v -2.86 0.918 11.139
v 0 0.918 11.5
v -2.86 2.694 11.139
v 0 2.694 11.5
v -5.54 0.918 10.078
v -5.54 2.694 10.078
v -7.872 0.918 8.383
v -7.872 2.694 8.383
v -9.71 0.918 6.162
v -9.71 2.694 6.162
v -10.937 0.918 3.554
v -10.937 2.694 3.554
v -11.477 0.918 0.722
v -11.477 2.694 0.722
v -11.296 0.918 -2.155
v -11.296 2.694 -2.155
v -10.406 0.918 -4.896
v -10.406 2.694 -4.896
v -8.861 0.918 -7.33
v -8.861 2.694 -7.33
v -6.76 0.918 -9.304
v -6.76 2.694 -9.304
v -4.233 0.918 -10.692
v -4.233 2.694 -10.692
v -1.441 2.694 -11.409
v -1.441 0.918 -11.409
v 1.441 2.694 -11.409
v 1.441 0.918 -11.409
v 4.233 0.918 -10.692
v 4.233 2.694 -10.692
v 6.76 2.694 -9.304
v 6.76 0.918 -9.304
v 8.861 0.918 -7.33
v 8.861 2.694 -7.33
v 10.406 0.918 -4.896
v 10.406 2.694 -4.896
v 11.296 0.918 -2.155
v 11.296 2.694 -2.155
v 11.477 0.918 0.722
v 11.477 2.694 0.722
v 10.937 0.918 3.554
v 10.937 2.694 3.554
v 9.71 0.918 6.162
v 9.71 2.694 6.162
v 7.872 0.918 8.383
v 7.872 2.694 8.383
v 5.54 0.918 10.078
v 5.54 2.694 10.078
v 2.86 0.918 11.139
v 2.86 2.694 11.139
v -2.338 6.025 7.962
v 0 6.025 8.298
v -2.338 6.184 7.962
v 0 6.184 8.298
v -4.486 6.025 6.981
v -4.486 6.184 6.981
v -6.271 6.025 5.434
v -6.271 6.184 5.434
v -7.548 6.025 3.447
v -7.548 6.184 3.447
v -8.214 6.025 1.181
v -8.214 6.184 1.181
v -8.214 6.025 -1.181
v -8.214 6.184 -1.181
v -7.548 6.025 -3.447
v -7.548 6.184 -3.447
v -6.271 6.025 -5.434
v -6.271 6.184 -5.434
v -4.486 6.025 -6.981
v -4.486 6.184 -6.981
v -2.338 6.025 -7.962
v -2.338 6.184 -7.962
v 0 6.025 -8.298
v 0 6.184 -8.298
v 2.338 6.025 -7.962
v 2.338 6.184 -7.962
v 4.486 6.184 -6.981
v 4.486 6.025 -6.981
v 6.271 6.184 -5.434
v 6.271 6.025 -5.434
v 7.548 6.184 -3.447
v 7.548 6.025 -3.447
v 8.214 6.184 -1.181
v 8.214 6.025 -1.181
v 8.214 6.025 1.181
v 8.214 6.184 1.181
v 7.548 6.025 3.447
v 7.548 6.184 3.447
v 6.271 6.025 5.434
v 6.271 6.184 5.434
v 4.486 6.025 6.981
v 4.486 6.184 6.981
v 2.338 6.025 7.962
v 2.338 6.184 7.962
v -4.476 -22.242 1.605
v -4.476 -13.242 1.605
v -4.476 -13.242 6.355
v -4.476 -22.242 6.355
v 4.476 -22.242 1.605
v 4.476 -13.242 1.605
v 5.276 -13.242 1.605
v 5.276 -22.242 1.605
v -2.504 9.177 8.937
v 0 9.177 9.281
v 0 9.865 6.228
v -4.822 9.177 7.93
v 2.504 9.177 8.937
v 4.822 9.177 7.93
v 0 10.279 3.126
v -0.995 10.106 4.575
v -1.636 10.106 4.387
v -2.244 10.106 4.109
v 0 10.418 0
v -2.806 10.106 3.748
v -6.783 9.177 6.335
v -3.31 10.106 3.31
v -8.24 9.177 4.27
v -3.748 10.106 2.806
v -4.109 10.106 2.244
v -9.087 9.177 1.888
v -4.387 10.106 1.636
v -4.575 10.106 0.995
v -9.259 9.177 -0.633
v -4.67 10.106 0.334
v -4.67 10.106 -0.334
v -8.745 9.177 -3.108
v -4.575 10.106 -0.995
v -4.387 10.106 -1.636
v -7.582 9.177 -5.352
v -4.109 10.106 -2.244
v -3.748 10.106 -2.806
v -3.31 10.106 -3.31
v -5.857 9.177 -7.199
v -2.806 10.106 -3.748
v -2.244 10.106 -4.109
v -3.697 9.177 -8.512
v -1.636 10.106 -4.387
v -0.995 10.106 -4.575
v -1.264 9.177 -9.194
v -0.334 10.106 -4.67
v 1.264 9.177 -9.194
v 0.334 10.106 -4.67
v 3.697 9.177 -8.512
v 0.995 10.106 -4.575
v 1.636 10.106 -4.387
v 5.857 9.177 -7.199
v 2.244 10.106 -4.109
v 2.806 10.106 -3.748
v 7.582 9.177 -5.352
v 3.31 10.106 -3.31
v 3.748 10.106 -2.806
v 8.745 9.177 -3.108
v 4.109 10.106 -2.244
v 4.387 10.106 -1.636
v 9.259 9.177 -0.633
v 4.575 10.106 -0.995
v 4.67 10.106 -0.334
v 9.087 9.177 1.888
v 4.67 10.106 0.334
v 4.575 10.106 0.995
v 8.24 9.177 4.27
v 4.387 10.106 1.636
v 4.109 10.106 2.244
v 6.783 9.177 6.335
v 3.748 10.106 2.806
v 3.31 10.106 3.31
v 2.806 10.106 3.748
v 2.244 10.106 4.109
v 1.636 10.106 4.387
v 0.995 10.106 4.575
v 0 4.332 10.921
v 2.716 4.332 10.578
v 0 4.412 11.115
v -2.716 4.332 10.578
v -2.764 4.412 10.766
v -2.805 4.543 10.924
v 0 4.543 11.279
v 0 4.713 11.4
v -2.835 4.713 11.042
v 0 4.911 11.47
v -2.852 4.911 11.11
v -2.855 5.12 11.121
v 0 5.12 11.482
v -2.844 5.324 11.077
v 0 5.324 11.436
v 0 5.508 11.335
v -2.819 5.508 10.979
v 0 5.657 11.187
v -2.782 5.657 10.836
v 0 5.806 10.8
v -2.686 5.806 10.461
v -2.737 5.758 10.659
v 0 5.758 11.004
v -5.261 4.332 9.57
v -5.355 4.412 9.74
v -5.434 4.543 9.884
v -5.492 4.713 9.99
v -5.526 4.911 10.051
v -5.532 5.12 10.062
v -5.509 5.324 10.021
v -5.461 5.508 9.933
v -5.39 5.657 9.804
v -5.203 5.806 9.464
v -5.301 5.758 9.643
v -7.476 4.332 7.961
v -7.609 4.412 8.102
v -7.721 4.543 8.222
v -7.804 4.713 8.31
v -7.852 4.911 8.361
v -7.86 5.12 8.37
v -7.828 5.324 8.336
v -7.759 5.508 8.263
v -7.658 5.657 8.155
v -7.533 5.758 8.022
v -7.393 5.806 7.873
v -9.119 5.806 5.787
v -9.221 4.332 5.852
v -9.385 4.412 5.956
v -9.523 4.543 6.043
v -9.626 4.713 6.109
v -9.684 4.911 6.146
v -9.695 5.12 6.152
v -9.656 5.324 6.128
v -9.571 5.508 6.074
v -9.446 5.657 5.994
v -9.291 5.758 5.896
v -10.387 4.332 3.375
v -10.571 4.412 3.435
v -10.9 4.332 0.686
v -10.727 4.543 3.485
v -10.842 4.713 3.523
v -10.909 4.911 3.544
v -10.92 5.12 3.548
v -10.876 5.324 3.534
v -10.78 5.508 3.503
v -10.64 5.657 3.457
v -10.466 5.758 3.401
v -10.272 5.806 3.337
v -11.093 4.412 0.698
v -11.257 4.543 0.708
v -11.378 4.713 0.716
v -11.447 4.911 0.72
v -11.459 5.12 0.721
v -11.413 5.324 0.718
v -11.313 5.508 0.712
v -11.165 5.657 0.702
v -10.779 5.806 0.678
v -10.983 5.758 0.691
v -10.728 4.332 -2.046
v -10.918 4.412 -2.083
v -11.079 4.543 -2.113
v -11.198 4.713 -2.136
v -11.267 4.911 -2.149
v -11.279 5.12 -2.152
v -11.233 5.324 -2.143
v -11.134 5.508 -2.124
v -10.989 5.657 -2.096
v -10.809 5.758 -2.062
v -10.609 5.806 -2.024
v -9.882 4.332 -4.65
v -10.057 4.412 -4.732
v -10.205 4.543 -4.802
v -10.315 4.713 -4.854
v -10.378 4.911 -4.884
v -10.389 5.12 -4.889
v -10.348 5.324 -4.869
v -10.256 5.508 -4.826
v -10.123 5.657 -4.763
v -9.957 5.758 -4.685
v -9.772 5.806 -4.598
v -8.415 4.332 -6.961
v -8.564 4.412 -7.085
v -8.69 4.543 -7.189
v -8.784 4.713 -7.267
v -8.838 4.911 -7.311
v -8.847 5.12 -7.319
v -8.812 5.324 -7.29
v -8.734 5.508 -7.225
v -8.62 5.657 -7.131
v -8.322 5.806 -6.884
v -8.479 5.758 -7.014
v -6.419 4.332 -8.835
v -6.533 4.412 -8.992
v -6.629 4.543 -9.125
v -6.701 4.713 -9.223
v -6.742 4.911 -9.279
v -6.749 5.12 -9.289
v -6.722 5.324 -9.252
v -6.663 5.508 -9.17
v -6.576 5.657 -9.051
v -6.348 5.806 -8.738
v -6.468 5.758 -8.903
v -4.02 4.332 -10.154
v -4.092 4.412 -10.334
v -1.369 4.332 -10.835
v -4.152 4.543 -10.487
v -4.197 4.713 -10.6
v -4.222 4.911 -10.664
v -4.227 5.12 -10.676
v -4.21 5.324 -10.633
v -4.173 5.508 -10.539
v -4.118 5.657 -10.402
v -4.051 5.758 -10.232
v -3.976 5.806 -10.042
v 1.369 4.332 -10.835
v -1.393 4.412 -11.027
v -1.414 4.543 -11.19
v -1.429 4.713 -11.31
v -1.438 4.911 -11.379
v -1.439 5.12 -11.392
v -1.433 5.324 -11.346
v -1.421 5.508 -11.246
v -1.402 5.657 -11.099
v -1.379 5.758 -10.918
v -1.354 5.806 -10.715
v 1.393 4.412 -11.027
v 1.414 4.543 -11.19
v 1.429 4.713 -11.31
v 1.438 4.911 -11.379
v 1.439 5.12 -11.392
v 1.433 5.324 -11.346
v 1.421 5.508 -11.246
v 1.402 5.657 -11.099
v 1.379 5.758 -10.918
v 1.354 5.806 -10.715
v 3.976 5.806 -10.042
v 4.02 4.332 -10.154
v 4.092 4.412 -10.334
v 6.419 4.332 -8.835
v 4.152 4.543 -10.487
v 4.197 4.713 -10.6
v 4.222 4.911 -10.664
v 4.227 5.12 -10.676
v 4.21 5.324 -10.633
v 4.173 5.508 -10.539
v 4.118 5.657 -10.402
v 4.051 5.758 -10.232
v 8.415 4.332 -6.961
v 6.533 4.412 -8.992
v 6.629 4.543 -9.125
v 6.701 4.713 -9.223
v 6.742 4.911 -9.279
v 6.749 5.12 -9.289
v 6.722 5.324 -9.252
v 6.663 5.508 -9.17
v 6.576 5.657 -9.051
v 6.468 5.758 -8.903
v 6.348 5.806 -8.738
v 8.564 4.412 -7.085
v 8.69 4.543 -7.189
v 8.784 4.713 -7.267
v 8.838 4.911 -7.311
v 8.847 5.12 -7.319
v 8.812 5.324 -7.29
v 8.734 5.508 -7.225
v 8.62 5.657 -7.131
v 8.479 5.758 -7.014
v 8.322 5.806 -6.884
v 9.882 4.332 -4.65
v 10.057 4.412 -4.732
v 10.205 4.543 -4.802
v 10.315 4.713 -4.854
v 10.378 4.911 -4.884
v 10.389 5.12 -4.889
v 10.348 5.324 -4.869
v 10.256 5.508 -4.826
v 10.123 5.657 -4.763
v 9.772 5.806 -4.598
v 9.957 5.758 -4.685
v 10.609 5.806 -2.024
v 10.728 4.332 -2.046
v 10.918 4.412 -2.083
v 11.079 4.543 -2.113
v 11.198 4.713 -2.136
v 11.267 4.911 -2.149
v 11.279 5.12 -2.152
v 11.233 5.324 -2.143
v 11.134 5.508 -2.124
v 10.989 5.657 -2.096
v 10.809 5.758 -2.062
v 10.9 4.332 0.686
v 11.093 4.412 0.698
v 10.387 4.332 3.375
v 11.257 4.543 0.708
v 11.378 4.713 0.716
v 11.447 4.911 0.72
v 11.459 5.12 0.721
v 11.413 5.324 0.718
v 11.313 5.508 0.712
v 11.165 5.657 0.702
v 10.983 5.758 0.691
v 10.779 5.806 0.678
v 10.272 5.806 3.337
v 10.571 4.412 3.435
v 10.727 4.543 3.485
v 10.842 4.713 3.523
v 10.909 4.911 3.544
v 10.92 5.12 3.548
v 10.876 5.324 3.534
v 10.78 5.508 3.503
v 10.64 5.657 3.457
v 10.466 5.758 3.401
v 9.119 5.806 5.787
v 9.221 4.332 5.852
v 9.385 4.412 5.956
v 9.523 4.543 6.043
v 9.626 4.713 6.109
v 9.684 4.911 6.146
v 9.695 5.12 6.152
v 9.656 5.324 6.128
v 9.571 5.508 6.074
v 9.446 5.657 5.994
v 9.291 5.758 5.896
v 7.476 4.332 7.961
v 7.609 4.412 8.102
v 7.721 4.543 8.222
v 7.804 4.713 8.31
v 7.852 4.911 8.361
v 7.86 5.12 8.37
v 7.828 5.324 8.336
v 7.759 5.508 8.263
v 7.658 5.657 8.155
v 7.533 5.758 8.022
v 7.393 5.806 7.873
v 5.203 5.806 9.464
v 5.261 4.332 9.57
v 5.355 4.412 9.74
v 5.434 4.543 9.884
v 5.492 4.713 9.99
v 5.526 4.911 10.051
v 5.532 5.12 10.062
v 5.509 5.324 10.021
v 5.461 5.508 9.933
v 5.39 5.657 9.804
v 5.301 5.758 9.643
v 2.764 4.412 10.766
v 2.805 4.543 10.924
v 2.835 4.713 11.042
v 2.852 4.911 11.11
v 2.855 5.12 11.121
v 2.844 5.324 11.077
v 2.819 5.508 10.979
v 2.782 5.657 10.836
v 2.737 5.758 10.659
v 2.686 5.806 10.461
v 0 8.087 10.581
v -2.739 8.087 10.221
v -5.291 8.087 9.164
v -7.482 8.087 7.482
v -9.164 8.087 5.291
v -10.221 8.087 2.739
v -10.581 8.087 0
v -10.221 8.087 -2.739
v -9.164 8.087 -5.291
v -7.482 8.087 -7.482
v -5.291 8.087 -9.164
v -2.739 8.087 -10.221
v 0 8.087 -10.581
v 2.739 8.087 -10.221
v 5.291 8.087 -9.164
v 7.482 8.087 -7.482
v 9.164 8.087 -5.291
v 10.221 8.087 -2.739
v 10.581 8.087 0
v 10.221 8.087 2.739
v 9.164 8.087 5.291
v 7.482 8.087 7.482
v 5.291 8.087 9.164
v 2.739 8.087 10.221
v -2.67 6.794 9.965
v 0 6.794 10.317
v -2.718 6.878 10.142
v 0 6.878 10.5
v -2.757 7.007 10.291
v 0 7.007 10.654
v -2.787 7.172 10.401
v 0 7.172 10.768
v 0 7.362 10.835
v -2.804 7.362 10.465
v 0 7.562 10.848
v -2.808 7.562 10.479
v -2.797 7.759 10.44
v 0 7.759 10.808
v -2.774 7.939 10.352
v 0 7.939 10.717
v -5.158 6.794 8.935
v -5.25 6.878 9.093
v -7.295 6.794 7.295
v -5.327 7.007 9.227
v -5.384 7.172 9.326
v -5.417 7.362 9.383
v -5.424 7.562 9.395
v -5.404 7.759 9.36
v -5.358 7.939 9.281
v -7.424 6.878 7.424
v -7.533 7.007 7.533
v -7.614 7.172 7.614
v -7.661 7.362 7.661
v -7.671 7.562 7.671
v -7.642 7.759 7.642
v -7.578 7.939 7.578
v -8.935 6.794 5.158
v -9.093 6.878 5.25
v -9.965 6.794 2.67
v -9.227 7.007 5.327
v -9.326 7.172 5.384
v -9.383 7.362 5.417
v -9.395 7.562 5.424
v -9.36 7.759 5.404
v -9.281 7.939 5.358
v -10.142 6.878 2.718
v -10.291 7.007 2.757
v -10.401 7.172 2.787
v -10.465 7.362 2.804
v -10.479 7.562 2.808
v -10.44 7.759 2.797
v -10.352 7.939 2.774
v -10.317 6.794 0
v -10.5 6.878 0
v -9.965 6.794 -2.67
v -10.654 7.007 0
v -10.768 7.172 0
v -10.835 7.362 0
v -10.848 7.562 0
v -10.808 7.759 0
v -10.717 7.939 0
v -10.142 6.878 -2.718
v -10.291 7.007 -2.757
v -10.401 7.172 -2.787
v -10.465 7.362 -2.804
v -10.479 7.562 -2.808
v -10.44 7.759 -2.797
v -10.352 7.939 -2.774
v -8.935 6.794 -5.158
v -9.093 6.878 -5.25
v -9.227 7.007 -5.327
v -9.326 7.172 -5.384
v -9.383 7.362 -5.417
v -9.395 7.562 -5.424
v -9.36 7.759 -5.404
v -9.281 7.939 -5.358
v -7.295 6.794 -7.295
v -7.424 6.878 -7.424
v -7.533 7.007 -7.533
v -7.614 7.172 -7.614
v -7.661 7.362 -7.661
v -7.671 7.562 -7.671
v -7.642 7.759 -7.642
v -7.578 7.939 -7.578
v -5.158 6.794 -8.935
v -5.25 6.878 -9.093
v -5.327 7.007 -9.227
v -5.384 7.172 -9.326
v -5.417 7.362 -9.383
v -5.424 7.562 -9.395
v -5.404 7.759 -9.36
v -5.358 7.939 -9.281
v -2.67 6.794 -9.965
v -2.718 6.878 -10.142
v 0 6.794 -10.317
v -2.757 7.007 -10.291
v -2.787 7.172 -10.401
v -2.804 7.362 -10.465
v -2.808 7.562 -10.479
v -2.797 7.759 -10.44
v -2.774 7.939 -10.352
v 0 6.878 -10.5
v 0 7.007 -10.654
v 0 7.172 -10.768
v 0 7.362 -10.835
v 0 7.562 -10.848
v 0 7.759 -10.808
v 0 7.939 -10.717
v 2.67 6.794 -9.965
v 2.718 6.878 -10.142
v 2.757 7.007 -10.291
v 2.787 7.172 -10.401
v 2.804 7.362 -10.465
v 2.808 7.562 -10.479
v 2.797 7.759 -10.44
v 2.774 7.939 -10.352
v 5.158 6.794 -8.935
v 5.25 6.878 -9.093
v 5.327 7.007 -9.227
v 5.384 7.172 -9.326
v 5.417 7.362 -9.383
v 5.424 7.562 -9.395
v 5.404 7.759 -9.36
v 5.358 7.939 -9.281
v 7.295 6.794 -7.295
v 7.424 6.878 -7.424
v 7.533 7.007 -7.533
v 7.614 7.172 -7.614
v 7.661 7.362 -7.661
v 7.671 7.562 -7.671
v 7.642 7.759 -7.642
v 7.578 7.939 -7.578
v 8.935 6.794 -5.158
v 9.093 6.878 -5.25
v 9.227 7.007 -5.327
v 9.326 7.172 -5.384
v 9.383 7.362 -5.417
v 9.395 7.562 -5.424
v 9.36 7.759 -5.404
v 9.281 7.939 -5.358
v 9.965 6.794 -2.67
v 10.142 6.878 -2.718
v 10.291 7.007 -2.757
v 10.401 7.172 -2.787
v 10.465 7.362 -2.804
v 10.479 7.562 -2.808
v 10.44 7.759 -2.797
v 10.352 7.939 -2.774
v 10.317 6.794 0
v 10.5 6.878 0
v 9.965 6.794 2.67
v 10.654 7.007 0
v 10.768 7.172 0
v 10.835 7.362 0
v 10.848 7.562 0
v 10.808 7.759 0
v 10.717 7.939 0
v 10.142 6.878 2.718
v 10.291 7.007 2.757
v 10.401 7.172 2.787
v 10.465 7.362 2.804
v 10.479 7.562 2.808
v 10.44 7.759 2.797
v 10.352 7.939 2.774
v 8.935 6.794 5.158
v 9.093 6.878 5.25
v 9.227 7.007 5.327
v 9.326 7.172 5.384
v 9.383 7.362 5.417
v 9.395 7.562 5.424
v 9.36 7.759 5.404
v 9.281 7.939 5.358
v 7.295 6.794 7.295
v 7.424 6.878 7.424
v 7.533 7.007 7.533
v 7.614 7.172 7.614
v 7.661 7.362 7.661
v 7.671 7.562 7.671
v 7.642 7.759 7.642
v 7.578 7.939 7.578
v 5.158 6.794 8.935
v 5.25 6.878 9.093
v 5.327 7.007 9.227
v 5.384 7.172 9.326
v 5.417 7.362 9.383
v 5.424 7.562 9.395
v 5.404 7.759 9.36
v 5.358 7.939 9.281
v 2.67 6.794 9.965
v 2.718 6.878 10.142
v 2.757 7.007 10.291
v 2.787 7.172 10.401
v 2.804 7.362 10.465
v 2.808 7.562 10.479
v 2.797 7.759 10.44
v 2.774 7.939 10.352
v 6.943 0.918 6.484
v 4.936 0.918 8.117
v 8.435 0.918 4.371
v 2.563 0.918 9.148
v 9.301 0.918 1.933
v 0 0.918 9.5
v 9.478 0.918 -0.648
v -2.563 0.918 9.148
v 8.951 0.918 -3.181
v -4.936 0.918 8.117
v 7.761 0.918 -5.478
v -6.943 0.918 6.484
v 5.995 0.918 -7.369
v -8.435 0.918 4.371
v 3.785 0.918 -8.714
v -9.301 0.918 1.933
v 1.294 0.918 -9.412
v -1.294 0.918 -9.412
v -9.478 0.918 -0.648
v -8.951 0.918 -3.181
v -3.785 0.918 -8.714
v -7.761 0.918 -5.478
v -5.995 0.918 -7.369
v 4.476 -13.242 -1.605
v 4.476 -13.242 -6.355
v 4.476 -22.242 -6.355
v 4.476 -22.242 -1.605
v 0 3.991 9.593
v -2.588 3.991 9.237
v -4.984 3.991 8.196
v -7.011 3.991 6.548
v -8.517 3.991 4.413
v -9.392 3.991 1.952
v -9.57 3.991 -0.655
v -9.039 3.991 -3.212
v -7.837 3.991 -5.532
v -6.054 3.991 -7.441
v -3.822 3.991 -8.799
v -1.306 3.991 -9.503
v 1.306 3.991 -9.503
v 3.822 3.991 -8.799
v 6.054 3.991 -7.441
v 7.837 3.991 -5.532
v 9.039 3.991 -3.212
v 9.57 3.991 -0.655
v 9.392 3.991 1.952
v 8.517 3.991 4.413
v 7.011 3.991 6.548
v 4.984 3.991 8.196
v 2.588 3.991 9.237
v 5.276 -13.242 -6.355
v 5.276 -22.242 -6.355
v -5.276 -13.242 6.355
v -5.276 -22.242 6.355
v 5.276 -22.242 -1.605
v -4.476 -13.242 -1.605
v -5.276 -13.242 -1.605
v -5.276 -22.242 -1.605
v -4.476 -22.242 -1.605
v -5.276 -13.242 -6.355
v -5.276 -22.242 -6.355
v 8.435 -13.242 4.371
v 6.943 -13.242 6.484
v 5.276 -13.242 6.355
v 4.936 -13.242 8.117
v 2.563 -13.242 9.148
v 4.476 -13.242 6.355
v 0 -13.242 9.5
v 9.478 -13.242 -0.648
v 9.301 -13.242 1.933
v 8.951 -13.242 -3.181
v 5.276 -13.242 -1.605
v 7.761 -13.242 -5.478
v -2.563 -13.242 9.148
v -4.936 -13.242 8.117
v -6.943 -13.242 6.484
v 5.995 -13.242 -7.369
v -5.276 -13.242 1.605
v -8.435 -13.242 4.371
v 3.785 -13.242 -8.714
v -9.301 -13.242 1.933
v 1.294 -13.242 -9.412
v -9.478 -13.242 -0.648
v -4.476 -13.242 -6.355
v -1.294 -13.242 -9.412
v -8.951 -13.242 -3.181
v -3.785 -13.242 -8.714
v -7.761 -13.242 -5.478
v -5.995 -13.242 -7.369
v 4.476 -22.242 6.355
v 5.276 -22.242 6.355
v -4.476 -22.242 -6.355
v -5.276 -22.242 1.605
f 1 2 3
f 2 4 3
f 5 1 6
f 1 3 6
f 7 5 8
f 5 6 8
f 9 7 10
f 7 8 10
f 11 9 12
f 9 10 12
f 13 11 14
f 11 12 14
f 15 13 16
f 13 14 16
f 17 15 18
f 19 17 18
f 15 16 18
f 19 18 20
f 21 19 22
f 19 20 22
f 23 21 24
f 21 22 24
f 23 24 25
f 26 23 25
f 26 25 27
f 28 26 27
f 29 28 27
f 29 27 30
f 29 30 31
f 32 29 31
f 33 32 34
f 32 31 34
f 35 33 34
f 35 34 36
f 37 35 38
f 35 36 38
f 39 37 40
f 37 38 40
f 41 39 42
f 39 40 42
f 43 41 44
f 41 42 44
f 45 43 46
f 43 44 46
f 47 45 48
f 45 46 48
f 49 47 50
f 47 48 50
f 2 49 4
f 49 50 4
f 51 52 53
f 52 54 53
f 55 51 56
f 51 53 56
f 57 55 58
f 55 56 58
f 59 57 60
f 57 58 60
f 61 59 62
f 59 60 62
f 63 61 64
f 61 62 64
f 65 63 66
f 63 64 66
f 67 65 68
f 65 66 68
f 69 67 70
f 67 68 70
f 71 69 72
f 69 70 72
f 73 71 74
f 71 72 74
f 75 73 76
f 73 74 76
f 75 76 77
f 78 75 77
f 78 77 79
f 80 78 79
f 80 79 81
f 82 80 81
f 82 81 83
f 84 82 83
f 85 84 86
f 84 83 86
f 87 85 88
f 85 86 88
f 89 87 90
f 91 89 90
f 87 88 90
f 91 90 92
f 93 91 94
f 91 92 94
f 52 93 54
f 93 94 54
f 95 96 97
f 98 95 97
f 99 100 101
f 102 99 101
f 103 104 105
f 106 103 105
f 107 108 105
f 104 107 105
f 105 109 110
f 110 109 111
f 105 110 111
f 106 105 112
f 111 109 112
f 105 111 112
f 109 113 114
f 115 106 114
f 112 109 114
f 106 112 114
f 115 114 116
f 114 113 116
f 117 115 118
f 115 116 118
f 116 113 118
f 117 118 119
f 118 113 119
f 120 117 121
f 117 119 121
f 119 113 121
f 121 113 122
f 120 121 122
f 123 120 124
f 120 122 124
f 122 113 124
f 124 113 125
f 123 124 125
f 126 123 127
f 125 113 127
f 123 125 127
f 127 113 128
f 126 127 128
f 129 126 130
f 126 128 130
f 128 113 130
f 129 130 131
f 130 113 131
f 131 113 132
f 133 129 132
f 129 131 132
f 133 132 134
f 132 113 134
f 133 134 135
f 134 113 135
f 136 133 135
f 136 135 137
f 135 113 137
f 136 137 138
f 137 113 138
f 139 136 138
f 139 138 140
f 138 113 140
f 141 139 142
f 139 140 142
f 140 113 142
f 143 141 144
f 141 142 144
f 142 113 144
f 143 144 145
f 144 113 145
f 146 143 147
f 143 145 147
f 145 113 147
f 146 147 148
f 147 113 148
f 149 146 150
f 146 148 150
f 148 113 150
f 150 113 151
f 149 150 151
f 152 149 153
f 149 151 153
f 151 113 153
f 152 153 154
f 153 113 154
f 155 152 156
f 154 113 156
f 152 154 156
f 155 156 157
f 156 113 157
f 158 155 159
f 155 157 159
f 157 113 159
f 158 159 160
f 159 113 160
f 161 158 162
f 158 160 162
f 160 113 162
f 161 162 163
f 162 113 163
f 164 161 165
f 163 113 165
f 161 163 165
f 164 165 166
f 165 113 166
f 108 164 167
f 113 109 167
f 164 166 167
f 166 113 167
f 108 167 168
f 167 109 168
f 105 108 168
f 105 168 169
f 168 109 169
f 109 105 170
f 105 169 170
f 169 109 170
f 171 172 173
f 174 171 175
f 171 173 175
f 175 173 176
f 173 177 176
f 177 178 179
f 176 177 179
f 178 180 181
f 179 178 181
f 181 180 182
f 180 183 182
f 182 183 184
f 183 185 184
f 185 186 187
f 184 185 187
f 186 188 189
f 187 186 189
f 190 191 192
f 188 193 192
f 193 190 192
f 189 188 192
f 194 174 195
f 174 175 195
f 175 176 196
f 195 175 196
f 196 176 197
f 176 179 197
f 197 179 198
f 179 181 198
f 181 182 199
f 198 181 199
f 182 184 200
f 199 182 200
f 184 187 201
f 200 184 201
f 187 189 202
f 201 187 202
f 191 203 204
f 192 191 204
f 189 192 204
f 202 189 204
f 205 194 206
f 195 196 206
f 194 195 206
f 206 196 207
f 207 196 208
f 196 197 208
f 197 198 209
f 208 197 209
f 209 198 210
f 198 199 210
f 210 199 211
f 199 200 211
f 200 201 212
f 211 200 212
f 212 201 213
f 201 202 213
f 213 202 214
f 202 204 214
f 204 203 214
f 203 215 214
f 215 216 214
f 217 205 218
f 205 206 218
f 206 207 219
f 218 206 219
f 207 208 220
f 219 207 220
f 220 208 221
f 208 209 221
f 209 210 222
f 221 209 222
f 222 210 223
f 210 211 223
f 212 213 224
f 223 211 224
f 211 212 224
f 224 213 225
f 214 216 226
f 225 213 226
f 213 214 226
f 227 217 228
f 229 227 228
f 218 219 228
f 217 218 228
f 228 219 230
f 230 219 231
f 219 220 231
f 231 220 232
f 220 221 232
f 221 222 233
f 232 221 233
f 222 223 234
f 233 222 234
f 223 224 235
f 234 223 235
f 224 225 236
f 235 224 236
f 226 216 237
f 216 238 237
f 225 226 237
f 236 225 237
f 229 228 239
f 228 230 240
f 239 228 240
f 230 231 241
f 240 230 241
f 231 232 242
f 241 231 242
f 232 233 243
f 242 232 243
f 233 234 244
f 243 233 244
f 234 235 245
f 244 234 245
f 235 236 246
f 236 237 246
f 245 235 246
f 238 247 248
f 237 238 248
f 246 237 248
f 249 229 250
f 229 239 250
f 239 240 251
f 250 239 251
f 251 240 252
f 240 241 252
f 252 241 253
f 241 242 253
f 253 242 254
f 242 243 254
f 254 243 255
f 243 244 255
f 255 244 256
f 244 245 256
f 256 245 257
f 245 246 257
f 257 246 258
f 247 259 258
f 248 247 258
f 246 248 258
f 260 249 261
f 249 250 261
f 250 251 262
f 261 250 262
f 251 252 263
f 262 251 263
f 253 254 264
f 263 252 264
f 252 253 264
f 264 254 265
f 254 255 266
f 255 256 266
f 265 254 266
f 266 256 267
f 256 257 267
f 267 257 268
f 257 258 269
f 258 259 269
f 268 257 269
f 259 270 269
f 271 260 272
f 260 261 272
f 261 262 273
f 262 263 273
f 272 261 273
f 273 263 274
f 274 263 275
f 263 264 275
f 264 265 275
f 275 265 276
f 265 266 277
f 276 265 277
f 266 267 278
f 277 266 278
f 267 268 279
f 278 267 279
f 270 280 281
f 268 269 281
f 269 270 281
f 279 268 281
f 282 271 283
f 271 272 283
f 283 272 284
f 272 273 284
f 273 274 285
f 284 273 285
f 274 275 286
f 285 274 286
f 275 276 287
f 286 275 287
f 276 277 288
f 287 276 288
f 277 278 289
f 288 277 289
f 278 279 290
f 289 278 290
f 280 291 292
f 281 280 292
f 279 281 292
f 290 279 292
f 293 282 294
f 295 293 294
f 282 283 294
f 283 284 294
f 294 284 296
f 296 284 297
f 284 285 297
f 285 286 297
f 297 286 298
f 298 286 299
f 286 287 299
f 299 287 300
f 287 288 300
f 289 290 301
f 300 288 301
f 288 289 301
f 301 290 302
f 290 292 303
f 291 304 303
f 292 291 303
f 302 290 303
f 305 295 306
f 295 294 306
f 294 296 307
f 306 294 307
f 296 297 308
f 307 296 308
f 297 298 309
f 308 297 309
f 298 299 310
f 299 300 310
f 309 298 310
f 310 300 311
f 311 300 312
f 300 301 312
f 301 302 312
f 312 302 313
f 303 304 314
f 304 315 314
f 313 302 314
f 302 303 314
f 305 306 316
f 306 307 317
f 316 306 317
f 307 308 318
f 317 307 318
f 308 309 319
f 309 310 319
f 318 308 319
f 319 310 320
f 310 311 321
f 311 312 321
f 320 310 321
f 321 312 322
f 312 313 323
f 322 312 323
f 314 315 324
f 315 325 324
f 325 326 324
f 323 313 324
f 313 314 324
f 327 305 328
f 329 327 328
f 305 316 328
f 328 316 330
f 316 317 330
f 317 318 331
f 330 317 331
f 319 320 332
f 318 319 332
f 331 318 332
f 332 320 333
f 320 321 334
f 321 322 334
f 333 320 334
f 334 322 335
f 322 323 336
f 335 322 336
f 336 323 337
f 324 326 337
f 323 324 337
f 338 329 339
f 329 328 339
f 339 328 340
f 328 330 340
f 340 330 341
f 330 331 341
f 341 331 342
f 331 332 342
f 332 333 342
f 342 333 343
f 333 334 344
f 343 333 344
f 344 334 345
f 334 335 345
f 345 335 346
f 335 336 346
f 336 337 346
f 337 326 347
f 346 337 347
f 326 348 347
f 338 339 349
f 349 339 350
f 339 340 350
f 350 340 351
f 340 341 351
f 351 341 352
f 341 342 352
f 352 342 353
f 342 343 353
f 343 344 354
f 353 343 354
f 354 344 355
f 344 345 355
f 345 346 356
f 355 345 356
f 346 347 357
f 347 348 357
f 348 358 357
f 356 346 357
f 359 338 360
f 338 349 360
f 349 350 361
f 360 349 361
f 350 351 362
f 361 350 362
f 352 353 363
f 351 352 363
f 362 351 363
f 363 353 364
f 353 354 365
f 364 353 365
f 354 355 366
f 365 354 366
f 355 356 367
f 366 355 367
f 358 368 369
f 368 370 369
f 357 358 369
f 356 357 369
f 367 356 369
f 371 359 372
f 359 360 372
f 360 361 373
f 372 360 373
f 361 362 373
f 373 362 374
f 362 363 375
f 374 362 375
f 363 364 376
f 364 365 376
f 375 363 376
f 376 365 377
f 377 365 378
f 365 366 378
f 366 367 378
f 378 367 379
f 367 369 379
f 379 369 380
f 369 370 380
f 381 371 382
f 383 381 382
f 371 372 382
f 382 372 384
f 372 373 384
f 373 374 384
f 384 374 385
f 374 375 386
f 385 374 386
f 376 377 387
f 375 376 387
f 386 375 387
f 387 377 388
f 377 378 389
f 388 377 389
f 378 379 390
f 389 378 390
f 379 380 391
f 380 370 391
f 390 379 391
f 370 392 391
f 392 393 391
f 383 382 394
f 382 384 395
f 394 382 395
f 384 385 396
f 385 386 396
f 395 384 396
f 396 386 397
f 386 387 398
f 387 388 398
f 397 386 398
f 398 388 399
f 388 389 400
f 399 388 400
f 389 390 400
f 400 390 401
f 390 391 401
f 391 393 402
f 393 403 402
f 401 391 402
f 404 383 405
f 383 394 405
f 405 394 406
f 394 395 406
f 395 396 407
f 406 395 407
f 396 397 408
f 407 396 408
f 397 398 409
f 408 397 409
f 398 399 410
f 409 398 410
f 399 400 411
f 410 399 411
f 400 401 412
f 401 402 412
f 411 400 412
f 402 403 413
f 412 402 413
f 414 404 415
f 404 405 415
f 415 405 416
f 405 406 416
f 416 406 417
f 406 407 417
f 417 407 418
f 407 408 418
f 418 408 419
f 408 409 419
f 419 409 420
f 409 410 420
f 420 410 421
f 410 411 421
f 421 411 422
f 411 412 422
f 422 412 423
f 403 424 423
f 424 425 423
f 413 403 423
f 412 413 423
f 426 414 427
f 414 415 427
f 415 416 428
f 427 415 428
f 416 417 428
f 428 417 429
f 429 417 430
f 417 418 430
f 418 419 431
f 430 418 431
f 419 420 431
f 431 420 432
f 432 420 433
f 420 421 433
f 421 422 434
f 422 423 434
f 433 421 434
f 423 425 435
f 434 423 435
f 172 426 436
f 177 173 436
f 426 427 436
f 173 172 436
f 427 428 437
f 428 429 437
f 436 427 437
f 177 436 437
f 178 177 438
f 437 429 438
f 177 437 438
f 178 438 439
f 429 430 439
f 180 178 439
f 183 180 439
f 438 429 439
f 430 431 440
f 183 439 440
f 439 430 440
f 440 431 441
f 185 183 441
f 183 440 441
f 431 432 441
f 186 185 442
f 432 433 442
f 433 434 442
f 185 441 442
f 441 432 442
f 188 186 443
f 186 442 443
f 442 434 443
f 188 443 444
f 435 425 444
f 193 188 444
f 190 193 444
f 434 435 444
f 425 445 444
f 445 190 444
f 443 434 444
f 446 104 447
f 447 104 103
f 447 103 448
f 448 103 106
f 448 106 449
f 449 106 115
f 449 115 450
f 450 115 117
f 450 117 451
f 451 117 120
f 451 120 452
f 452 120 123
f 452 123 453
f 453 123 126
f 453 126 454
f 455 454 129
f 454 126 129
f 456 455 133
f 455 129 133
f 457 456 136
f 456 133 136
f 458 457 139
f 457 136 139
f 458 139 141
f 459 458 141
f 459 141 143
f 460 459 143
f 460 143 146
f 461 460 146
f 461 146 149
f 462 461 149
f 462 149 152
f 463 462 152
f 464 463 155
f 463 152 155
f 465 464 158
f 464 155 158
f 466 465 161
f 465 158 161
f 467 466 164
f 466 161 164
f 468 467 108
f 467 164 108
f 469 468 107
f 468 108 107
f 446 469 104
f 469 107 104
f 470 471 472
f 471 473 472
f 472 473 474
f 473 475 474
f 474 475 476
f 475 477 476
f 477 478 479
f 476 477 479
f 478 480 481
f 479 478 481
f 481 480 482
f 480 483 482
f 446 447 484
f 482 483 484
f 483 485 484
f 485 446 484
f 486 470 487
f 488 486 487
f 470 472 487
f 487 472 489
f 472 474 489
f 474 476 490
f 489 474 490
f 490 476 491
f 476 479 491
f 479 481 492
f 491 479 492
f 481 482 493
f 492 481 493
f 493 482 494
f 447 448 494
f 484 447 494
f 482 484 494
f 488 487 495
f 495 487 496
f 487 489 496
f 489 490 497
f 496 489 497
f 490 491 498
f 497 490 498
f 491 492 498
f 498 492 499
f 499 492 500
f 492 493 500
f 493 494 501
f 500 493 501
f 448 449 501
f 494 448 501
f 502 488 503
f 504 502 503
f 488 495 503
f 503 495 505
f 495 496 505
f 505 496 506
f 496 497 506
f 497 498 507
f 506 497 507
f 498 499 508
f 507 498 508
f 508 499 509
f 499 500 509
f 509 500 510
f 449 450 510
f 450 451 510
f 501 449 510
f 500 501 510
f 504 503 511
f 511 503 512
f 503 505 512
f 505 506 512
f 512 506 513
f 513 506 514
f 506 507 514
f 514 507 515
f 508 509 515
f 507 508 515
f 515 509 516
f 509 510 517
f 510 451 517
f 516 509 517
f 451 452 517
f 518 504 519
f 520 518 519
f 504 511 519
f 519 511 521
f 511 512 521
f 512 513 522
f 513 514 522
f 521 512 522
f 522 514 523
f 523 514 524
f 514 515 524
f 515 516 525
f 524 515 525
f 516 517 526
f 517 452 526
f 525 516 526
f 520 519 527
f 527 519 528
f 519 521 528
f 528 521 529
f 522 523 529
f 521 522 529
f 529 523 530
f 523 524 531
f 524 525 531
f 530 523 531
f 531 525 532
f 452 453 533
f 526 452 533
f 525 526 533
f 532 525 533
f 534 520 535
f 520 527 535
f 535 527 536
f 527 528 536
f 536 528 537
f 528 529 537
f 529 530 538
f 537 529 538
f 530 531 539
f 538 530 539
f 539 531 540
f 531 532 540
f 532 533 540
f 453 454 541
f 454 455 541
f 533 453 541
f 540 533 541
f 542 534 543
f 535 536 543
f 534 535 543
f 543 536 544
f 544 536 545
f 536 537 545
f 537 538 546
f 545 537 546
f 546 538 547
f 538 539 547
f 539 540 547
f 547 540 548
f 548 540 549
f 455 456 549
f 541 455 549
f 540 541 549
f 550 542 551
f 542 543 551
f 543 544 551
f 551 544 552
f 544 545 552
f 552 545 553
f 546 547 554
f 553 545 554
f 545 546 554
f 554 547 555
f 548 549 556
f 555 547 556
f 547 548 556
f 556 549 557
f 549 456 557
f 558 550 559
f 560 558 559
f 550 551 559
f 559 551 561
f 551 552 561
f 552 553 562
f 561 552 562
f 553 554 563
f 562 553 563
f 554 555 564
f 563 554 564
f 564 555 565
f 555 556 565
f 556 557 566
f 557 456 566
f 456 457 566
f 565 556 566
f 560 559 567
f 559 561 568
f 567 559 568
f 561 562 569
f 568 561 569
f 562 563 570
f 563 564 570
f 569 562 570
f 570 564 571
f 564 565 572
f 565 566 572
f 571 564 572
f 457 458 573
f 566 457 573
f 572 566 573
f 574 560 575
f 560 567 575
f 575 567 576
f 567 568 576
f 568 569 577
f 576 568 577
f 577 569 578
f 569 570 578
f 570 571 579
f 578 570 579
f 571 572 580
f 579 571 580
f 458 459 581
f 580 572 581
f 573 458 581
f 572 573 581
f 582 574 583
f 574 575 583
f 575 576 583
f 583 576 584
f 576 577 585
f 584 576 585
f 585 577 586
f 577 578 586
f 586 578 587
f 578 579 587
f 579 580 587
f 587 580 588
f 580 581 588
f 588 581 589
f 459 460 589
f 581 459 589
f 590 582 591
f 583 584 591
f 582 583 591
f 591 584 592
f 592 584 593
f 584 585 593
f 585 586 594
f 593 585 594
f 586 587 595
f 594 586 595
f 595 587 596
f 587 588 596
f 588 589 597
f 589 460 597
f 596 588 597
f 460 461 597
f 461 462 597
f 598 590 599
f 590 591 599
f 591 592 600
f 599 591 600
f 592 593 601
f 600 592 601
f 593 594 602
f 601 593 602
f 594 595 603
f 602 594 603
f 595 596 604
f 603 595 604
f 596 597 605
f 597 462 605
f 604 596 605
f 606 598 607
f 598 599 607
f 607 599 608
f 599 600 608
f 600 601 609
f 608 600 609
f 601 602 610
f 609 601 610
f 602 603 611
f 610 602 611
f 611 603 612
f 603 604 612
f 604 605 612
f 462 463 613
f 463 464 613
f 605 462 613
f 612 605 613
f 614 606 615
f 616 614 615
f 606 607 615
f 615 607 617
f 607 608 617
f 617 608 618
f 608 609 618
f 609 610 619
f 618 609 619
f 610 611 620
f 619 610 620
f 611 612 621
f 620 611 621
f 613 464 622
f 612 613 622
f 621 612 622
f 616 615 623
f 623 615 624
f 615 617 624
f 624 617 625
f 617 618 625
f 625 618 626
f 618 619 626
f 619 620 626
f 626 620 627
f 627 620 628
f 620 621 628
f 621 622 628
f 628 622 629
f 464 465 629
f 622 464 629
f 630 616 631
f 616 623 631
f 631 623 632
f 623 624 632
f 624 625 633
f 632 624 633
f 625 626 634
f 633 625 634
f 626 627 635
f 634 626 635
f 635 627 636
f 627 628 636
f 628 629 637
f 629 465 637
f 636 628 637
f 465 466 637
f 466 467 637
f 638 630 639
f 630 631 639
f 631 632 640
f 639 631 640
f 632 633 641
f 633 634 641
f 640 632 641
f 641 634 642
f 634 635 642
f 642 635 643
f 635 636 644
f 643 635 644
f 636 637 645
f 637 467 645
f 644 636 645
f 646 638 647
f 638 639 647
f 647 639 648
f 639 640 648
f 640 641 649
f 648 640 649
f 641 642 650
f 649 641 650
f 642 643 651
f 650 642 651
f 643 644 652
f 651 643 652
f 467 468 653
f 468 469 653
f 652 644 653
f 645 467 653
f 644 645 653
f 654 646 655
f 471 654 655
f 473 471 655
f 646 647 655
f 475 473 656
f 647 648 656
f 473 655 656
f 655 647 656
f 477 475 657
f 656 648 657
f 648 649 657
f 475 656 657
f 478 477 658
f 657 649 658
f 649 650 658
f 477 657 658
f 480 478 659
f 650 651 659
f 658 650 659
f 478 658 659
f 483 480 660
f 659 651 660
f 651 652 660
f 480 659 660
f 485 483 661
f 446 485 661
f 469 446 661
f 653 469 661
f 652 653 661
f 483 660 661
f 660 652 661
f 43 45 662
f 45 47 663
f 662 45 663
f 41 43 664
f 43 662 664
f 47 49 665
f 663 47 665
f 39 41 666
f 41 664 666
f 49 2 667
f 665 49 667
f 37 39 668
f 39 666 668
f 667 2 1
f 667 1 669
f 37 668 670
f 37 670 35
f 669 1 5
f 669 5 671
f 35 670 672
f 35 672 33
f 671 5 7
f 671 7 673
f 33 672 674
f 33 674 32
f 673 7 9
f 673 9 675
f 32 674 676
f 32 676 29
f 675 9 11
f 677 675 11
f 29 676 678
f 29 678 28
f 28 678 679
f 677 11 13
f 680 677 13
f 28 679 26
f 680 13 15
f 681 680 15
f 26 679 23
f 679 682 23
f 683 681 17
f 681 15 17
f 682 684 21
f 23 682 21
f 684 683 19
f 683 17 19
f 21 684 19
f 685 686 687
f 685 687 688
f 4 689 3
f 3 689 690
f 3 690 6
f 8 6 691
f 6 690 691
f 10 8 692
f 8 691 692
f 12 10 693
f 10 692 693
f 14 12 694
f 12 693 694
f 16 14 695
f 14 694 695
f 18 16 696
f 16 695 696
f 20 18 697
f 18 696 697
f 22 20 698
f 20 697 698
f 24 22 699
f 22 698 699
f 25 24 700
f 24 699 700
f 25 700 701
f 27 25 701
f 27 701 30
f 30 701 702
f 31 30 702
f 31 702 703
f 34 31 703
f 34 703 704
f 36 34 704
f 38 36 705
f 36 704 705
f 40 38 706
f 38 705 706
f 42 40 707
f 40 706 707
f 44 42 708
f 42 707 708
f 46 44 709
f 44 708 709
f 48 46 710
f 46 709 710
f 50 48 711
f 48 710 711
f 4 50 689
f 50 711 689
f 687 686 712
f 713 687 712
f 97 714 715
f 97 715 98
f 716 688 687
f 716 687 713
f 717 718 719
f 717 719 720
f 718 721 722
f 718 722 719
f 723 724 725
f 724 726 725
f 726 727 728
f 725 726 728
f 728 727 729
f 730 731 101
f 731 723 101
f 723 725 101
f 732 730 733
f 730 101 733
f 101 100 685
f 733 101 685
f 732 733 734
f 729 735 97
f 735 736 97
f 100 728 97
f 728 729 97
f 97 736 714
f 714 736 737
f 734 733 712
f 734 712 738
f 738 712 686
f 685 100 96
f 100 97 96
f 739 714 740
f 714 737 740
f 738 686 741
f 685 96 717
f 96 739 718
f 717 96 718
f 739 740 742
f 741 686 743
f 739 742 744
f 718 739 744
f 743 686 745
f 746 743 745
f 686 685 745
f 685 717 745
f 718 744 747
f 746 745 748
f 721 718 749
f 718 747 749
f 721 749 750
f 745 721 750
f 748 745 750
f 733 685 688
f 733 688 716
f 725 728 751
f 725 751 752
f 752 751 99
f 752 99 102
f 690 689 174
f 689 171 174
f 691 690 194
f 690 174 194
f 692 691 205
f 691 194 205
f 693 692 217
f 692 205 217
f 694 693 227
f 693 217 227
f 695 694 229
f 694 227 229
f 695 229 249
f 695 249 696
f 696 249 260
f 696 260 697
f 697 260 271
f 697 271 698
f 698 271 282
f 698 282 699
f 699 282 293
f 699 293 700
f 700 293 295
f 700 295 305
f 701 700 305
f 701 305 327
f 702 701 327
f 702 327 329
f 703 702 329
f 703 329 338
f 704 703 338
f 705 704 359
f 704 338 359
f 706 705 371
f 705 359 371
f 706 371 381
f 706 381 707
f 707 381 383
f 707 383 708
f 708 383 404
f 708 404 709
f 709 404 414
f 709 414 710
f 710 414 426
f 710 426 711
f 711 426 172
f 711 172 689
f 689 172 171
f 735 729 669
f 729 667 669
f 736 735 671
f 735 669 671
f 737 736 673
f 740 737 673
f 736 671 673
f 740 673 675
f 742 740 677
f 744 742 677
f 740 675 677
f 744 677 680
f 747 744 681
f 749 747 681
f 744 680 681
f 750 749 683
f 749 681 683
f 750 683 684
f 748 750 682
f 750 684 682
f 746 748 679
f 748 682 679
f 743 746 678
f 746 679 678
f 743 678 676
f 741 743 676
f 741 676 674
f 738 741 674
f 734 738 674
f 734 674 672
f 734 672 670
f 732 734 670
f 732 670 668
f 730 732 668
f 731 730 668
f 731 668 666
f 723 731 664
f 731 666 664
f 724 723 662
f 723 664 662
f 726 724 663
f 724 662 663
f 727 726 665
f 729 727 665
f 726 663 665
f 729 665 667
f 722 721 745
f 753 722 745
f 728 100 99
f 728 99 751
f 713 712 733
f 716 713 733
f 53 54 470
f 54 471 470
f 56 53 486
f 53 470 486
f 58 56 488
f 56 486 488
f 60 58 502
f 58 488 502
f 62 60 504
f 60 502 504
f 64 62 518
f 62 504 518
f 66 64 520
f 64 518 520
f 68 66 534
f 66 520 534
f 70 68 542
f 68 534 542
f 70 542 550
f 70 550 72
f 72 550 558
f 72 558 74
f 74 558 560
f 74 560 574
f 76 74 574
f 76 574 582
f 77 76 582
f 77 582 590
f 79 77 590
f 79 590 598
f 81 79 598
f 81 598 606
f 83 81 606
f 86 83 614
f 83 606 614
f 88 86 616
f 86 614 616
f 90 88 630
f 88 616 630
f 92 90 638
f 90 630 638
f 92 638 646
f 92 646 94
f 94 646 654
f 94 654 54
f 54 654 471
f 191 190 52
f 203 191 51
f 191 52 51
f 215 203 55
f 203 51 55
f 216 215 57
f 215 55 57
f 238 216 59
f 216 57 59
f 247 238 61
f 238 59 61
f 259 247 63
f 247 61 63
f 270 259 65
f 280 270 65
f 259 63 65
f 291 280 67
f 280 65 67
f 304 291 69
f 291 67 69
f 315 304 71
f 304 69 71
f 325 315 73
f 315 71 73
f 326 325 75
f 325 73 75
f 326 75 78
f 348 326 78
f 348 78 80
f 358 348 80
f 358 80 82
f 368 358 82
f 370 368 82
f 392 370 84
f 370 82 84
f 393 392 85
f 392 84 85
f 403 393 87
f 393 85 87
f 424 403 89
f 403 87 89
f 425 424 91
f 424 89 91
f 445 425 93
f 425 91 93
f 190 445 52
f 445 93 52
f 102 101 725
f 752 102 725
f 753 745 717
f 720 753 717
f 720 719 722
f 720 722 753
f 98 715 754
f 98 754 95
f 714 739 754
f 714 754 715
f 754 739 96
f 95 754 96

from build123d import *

# Parameters (mm, degrees)
SKETCH3_W           = 0.8
SKETCH3_H           = 4.75
BOSS_EXTRUDE1_DEPTH = 9


with BuildPart() as part:
    # Sketch1 → Revolve2 (revolve)
    with BuildSketch(Plane.XY, mode=Mode.PRIVATE) as revolve2_sk:
        with BuildLine():
            Line((0, -13.24200419), (-9.5, -13.24200419))
            Line((-9.5, -13.24200419), (-9.5, 0.9180652))
            Line((-9.5, 0.9180652), (-11.5, 0.9180652))
            Line((-11.5, 0.9180652), (-11.5, 2.69389815))
            Line((-11.5, 2.69389815), (-9.59273849, 3.99115987))
            Line((-9.59273849, 3.99115987), (-10.921099291, 4.332198136))
            ThreePointArc((-10.921099291, 4.332198136), (-11.482083746, 5.119970296), (-10.800193426, 5.805764819))
            Line((-10.800193426, 5.805764819), (-8.297971346, 6.025460413))
            Line((-8.297971346, 6.025460413), (-8.297971346, 6.184171242))
            Line((-8.297971346, 6.184171242), (-10.316863696, 6.794381901))
            ThreePointArc((-10.316863696, 6.794381901), (-10.83463658, 7.361906816), (-10.581495802, 8.087229527))
            Line((-10.581495802, 8.087229527), (-9.280818948, 9.176830883))
            Line((-9.280818948, 9.176830883), (0, 9.176830883))
            Line((0, 9.176830883), (0, -13.24200419))
        make_face()
    revolve(revolve2_sk.sketch.rotate(Axis((0, 40.42841221, 0), (0, -1, 0)), 270), axis=Axis((0, 40.42841221, 0), (0, -1, 0)))

    # Sketch2 → Revolve3 (revolve)
    with BuildSketch(Plane.XY, mode=Mode.PRIVATE) as revolve3_sk:
        with BuildLine():
            Line((0, 9.176830883), (-9.280818948, 9.176830883))
            ThreePointArc((-9.280818948, 9.176830883), (-4.681726791, 10.106381279), (0, 10.4180652))
            Line((0, 10.4180652), (0, 9.176830883))
        make_face()
    revolve(revolve3_sk.sketch.rotate(Axis((0, 15.762950143, 0), (0, -1, 0)), 270), axis=Axis((0, 15.762950143, 0), (0, -1, 0)))

    # Sketch3 → Boss-Extrude1 (add)
    with BuildSketch(Plane.XZ.offset(13.24200419)):
        with Locations((-4.875927863, 3.979511683)):
            Rectangle(SKETCH3_W, SKETCH3_H)
        with Locations((4.875927863, 3.979511683)):
            Rectangle(SKETCH3_W, SKETCH3_H)
        with Locations((4.875927863, -3.979511683)):
            Rectangle(SKETCH3_W, SKETCH3_H)
        with Locations((-4.875927863, -3.979511683)):
            Rectangle(SKETCH3_W, SKETCH3_H)
    extrude(amount=BOSS_EXTRUDE1_DEPTH)


solid = part.part
